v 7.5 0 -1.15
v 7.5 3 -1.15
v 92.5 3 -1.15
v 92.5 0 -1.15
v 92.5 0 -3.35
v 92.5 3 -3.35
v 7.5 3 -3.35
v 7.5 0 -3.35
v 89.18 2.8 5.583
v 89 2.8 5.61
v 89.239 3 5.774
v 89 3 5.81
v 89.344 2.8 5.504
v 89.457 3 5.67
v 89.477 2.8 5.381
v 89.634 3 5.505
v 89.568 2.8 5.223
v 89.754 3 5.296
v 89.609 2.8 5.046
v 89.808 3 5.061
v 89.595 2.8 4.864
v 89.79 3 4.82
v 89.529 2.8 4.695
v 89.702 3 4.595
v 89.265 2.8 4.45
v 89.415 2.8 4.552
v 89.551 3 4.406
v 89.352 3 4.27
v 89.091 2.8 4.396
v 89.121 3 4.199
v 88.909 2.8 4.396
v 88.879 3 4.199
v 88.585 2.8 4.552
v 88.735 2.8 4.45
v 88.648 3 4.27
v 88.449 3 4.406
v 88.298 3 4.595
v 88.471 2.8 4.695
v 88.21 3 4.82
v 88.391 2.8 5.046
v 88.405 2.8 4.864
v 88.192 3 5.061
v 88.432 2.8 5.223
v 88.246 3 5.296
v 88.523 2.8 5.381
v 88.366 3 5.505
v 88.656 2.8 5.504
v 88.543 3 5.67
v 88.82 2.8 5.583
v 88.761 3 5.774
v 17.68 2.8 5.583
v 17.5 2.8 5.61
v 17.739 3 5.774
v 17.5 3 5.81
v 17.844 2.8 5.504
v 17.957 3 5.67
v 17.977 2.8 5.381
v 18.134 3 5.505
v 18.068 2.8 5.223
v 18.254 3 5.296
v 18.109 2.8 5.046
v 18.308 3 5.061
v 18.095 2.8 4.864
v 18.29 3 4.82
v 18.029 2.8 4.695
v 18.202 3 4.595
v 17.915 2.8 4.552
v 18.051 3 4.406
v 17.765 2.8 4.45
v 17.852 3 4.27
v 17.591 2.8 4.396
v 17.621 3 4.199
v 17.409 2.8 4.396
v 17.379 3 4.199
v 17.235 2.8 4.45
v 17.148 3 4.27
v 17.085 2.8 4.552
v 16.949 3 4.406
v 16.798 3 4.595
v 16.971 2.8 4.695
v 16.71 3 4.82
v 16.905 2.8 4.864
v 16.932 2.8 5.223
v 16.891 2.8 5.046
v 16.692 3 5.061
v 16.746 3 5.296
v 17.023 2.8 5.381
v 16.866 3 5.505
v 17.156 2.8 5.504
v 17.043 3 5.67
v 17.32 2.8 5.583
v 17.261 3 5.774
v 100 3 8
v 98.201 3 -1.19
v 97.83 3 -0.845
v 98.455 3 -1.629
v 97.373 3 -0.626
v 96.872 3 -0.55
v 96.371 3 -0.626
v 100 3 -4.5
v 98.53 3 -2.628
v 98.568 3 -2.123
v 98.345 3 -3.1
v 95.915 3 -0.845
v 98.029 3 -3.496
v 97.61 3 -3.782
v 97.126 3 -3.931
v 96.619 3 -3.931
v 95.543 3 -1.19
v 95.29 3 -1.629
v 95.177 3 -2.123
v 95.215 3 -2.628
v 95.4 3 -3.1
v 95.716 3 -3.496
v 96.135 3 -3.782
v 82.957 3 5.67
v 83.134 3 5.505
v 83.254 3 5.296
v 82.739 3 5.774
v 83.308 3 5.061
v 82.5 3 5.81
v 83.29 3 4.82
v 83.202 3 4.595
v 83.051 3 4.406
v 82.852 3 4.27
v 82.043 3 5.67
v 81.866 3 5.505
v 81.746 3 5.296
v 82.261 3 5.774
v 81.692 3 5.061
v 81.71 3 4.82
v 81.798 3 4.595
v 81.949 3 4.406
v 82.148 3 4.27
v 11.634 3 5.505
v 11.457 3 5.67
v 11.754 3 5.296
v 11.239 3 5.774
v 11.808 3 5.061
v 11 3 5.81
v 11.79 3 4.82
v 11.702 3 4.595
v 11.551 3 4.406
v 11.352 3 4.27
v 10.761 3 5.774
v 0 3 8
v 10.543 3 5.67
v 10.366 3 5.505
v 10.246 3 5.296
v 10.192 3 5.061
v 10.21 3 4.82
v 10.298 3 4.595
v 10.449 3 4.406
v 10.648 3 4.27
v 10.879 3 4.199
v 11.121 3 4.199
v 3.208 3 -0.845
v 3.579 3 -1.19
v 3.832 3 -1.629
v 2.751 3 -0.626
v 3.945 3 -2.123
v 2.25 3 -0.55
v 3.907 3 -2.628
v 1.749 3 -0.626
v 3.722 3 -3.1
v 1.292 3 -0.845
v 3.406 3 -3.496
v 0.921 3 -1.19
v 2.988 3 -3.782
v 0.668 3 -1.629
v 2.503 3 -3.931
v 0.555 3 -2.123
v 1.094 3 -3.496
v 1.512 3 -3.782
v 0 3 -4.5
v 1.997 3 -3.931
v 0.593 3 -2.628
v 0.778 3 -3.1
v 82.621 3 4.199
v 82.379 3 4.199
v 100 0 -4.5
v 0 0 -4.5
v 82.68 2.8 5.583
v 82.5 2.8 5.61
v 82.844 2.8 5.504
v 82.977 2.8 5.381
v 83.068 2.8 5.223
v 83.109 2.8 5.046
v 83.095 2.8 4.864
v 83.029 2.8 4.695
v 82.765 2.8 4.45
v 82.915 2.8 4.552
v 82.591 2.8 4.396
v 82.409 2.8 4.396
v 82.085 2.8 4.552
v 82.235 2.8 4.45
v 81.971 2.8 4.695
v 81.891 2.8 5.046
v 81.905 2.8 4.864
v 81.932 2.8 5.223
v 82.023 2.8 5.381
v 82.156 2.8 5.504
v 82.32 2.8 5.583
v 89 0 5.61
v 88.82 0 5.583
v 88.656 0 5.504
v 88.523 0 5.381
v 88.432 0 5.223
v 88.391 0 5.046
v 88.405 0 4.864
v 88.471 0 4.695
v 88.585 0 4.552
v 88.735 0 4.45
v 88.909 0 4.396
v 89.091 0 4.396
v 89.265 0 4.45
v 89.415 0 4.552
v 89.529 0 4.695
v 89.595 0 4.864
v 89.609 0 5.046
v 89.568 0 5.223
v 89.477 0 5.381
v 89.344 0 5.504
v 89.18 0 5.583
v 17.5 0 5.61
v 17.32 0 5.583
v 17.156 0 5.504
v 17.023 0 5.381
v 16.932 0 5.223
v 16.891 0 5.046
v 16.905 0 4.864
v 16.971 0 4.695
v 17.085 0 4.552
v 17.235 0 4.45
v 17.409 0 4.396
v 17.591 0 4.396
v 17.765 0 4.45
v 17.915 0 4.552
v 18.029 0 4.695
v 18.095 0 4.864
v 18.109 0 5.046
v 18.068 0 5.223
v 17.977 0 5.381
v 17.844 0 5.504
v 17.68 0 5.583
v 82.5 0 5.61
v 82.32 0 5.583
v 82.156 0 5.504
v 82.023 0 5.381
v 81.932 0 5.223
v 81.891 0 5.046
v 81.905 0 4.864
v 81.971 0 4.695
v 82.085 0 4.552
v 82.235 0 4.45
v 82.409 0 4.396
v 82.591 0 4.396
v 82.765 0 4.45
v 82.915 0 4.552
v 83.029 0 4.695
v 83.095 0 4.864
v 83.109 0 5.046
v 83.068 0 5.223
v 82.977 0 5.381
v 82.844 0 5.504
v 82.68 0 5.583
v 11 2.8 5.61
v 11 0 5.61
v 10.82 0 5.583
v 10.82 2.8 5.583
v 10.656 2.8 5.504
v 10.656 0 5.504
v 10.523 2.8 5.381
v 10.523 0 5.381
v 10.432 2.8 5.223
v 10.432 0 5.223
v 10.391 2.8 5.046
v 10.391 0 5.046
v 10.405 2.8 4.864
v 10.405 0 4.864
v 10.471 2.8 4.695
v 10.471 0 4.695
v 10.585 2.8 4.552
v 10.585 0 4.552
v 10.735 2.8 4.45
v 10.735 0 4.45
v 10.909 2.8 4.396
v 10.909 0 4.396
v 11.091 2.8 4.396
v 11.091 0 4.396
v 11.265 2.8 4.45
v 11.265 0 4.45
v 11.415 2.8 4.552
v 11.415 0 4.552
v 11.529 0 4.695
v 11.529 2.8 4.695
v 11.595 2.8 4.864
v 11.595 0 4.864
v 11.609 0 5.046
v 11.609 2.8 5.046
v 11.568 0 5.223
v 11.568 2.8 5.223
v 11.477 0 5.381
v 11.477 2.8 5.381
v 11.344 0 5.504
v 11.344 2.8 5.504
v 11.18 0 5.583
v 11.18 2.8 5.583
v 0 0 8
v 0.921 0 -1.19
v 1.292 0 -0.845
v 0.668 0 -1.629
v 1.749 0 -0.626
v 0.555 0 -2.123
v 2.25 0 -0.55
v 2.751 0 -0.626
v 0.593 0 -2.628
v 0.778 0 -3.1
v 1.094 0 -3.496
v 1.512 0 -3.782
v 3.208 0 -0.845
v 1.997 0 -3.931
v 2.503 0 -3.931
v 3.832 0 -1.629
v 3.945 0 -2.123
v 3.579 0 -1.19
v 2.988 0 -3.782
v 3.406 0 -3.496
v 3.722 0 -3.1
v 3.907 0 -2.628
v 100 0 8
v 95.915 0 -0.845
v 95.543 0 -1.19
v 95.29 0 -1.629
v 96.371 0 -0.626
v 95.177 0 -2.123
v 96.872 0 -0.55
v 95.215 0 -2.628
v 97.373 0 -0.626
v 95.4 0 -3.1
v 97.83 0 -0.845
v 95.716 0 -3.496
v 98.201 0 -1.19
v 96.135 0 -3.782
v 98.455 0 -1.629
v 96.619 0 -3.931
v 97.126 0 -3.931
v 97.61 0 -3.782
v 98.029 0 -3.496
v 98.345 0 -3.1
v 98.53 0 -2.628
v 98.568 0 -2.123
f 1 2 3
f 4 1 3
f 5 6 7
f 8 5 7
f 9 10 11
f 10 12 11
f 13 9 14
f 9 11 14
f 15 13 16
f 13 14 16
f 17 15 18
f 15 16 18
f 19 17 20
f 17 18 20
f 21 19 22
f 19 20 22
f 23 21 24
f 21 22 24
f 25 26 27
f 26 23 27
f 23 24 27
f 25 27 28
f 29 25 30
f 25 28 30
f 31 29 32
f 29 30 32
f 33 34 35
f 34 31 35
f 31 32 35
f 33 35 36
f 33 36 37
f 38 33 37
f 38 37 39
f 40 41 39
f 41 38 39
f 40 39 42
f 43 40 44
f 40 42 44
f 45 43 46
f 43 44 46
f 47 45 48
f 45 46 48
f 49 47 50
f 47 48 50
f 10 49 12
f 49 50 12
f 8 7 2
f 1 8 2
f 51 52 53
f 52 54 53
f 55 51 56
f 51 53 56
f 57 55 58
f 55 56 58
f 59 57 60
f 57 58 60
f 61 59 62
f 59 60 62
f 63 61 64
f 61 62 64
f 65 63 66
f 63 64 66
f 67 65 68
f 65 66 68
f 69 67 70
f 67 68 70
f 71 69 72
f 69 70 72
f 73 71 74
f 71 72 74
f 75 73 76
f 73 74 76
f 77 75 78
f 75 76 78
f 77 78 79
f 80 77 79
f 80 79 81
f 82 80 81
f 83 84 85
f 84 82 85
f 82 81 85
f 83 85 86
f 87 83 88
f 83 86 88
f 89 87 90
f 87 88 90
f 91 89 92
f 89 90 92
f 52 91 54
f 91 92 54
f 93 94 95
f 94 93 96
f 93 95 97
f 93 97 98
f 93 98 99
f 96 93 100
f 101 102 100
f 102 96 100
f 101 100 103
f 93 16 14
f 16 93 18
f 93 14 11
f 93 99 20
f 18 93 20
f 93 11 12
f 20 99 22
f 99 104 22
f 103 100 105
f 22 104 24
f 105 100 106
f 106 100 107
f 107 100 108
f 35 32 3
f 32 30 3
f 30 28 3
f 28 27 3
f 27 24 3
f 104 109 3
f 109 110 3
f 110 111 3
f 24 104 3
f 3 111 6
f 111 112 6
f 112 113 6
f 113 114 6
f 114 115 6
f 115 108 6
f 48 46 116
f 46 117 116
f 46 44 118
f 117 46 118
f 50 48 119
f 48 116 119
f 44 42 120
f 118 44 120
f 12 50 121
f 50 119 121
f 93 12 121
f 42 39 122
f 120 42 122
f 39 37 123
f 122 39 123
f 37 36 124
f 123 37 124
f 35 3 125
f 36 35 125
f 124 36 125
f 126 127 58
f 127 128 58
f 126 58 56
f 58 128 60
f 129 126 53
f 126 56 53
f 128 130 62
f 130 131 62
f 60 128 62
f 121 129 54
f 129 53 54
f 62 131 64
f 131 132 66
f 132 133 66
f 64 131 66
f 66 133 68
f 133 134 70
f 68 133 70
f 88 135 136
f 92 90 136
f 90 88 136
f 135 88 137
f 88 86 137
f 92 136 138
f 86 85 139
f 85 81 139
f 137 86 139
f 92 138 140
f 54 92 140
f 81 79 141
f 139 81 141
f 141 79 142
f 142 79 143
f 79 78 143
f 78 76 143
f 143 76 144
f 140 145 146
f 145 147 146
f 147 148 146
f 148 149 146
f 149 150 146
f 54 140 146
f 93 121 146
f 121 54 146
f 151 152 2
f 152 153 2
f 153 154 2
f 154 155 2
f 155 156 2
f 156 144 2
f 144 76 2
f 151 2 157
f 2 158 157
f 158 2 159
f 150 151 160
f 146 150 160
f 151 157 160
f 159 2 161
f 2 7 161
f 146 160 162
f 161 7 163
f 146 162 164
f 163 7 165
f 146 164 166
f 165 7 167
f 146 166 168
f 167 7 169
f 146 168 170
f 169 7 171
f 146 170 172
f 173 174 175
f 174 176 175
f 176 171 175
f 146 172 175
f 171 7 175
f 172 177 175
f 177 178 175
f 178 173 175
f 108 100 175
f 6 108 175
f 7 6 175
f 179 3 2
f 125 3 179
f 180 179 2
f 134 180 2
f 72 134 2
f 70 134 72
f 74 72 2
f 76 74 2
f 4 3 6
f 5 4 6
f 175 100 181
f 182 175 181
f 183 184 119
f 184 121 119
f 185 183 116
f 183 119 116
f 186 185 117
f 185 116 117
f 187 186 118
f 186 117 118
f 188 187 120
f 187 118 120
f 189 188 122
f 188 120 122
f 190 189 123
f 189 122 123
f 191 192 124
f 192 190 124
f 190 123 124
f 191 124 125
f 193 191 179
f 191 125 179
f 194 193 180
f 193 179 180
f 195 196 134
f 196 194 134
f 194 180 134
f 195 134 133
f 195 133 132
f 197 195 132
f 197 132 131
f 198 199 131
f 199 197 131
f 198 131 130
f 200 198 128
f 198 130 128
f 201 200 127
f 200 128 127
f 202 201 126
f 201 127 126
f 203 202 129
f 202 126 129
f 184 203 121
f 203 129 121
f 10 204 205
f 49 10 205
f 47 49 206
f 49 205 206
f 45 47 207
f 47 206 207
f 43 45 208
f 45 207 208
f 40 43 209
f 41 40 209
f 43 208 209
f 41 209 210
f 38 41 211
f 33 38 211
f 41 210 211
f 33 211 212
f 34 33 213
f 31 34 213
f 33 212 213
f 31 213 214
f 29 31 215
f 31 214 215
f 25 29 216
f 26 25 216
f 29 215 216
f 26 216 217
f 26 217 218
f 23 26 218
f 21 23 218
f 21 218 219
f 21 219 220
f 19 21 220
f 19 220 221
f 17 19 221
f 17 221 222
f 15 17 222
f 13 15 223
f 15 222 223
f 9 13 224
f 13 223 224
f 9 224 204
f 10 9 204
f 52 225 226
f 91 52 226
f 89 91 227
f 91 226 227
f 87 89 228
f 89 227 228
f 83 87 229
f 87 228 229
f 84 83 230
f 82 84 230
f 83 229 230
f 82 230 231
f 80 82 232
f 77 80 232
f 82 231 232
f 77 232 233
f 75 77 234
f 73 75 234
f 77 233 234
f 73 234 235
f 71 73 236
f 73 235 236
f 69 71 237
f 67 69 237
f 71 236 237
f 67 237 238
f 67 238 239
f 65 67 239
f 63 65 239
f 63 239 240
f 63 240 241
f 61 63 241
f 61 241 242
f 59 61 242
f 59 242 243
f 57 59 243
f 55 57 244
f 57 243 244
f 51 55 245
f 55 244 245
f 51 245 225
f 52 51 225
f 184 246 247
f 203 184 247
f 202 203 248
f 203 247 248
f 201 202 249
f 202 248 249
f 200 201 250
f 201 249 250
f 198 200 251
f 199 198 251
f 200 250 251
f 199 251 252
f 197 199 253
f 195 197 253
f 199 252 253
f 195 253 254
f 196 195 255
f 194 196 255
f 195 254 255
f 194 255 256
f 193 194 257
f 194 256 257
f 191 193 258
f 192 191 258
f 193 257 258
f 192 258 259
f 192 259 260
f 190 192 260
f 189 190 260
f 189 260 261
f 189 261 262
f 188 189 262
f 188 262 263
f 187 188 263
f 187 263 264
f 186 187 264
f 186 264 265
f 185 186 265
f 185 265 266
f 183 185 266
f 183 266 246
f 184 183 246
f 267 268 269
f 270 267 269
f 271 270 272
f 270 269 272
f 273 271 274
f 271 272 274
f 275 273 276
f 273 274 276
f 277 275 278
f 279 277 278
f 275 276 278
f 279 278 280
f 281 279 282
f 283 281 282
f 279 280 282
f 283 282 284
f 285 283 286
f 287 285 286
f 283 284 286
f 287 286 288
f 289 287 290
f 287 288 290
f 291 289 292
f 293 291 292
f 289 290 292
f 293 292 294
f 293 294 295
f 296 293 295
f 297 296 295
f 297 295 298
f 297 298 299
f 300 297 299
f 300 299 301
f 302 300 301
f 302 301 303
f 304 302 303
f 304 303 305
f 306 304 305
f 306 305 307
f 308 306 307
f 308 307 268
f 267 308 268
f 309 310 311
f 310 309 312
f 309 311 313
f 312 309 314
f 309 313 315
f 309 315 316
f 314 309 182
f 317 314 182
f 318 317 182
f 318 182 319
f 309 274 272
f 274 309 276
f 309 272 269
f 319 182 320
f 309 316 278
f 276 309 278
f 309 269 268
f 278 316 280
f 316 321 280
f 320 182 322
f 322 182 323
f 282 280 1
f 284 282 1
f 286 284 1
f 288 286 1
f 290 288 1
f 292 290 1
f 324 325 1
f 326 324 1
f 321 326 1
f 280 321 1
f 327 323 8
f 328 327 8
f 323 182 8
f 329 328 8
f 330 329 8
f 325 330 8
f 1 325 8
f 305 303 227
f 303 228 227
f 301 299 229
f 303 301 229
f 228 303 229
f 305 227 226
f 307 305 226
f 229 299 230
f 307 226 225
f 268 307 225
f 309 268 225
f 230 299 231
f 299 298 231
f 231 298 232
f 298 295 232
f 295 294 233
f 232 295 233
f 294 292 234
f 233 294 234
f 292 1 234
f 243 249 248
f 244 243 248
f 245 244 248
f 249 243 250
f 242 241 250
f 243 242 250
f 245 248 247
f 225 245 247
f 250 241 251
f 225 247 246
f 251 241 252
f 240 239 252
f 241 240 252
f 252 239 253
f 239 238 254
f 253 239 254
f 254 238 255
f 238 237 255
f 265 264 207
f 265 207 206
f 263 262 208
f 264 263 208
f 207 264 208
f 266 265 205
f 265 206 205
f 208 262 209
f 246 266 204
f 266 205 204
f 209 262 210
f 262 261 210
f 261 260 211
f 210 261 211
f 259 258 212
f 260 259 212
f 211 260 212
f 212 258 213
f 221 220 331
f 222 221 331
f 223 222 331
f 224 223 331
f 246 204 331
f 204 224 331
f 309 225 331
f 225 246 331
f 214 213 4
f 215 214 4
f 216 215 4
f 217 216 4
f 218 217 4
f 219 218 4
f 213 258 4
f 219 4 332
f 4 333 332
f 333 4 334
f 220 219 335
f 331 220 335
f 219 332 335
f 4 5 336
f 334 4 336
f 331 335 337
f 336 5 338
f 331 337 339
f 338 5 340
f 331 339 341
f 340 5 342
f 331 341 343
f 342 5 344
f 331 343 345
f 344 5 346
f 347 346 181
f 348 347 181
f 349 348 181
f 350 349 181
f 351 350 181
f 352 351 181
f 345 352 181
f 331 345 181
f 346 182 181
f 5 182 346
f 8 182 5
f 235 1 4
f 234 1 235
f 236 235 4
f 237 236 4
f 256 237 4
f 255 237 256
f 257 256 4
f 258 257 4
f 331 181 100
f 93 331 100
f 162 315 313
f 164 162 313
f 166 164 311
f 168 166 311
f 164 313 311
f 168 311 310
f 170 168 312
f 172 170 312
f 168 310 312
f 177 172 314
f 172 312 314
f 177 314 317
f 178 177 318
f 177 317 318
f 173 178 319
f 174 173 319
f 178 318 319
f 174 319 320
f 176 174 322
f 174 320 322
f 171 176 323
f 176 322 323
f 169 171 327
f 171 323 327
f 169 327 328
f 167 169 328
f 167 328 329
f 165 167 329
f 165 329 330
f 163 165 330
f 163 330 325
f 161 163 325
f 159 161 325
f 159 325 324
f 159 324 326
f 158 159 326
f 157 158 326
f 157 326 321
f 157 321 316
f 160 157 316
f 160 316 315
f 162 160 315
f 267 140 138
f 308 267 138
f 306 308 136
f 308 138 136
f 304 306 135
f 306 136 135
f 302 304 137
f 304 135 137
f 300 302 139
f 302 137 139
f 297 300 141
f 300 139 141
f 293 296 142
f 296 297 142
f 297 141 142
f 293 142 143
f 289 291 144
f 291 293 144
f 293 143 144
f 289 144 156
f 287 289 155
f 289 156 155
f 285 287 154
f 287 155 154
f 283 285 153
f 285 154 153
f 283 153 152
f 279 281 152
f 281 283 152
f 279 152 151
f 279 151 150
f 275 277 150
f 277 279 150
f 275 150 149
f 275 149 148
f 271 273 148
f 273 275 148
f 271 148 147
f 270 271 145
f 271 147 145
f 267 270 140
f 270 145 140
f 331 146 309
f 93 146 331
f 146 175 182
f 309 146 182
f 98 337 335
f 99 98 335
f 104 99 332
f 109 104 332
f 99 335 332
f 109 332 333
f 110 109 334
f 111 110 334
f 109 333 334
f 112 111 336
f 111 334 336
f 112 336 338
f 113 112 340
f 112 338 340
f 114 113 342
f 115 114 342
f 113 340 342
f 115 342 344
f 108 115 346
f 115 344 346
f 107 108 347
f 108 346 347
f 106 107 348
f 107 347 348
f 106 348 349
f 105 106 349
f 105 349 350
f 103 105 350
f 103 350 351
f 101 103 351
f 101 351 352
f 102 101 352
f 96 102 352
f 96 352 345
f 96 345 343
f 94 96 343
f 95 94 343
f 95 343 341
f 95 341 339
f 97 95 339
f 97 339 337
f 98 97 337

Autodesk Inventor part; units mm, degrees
ref_plane "YZ Plane" through (0, 0, 0) normal (1, 0, 0) x (0, 1, 0)
ref_plane "XZ Plane" through (0, 0, 0) normal (0, 1, 0) x (-1, 0, 0)
ref_plane "XY Plane" through (0, 0, 0) normal (0, 0, 1) x (1, 0, 0)
sketch "Sketch4" plane through (0, 0, 0) normal (1, 0, 0) x (0, 1, 0)
  line L0 (0, 0) -> (3, 0)
  line L1 (3, 0) -> (3, -4.5)
  line L2 (3, -4.5) -> (0, -4.5)
  line L3 (0, -4.5) -> (0, 0)
  dimension "d21" = 3
  dimension "d22" = 4.5
extrude "Extrusion2" add sketch "Sketch4" along normal blind 100
sketch "Sketch5" plane through (0, 3, 0) normal (0, 1, 0) x (1, 0, 0)
  circle A0 centre (2.25, 2.25) radius 1.5
  circle A1 centre (96.8723, 2.25) radius 1.5
  line L0 (0, 4.5) -> (0, 0) construction
  line L1 (0, 0) -> (100, 0) construction
  dimension "d25" = 3
  dimension "d26" = 3
  dimension "d27" = 2.25
  dimension "d28" = 2.25
  dimension "d29" = 4.5
hole "Hole2" at (2.25, 3, -2.25) at (96.8723, 3, -2.25) direction (0, -1, 0) diameter 3.4 depth 8.8 tip angle 118 clearance for "Socket Head Cap Screw ISO 4762" size "M3" standard "ISO"
sketch "Sketch6" plane through (0, 3, 0) normal (0, 1, 0) x (1, 0, 0)
  line L0 (7.5, 1.15) -> (92.5, 1.15)
  line L1 (92.5, 1.15) -> (92.5, 3.35)
  line L2 (92.5, 3.35) -> (7.5, 3.35)
  line L3 (7.5, 3.35) -> (7.5, 1.15)
  line L4 (0, 4.5) -> (100, 4.5) projected
  line L5 (0, 0) -> (100, 0) projected
  line L6 (0, 4.5) -> (0, 0) projected
  dimension "d37" = 85
  dimension "d38" = 2.2
  dimension "d39" = 4.5
  dimension "d40" = 1.15
  dimension "d41" = 7.5
extrude "Extrusion3" cut sketch "Sketch6" against normal blind 100
sketch "Sketch7" plane through (0, 0, 0) normal (0, 0, 1) x (1, 0, 0)
  line L0 (0, 0) -> (100, 0)
  line L1 (100, 0) -> (100, 3)
  line L2 (100, 3) -> (0, 3)
  line L3 (0, 3) -> (0, 0)
extrude "Extrusion4" add sketch "Sketch7" along normal blind 8
sketch "Sketch8" plane through (0, 3, -4.5) normal (0, 1, 0) x (1, 0, 0)
  line L0 (11, -9.5) -> (89, -9.5) construction
  line L1 (0, 0) -> (0, -12.5) projected
  line L2 (-1, -16) -> (89, -16) construction
  line L3 (-1, -17) -> (89, -17) construction
  line L4 (89, -15) -> (-1, -15) construction
  arc A0 (-1, -15) -> (-1, -17) centre (-1, -16) ccw construction
  arc A1 (89, -17) -> (89, -15) centre (89, -16) ccw construction
  circle A2 centre (11, -9.5) radius 1
  circle A3 centre (89, -9.5) radius 1
  circle A4 centre (82.5, -9.5) radius 1
  circle A5 centre (17.5, -9.5) radius 1
  point P0 (0, -4.5)
  point P1 (50, -9.5)
  point P2 (44, -16)
  dimension "d47" = 78
  dimension "d48" = 50
  dimension "d49" = 2
  dimension "d50" = 90
  dimension "d51" = 6.5
  dimension "d54" = 9.5
  dimension "d55" = 2
  dimension "d56" = 2
  dimension "d57" = 2
  dimension "d58" = 2
  dimension "d59" = 6.5
  dimension "d60" = 6.5
sketch "Sketch9" plane through (0, 0, -4.5) normal (0, -1, 0) x (1, 0, 0)
  point P0 (0, 4.5)
sketch "Sketch10" plane through (0, 0, -4.5) normal (0, -1, 0) x (1, 0, 0)
  point P0 (0, 4.5)
hole "Hole3" at (11, 3, 5) at (17.5, 3, 5) at (82.5, 3, 5) at (89, 3, 5) direction (0, -1, 0) diameter 1.221 depth 5.3 tip angle 118 thread size "M1.6x0.35" class "6H" standard "ISO Metric profile"
chamfer "Chamfer1" distance 0.2 angle 45 4 edges at (11, 3, 4.3895) (17.5, 3, 4.3895) (82.5, 3, 4.3895) (89, 3, 4.3895)
equation "\"d27\" = d28"
equation "\"d28\" = 0.5 * d29"
properties part number "szyna"
